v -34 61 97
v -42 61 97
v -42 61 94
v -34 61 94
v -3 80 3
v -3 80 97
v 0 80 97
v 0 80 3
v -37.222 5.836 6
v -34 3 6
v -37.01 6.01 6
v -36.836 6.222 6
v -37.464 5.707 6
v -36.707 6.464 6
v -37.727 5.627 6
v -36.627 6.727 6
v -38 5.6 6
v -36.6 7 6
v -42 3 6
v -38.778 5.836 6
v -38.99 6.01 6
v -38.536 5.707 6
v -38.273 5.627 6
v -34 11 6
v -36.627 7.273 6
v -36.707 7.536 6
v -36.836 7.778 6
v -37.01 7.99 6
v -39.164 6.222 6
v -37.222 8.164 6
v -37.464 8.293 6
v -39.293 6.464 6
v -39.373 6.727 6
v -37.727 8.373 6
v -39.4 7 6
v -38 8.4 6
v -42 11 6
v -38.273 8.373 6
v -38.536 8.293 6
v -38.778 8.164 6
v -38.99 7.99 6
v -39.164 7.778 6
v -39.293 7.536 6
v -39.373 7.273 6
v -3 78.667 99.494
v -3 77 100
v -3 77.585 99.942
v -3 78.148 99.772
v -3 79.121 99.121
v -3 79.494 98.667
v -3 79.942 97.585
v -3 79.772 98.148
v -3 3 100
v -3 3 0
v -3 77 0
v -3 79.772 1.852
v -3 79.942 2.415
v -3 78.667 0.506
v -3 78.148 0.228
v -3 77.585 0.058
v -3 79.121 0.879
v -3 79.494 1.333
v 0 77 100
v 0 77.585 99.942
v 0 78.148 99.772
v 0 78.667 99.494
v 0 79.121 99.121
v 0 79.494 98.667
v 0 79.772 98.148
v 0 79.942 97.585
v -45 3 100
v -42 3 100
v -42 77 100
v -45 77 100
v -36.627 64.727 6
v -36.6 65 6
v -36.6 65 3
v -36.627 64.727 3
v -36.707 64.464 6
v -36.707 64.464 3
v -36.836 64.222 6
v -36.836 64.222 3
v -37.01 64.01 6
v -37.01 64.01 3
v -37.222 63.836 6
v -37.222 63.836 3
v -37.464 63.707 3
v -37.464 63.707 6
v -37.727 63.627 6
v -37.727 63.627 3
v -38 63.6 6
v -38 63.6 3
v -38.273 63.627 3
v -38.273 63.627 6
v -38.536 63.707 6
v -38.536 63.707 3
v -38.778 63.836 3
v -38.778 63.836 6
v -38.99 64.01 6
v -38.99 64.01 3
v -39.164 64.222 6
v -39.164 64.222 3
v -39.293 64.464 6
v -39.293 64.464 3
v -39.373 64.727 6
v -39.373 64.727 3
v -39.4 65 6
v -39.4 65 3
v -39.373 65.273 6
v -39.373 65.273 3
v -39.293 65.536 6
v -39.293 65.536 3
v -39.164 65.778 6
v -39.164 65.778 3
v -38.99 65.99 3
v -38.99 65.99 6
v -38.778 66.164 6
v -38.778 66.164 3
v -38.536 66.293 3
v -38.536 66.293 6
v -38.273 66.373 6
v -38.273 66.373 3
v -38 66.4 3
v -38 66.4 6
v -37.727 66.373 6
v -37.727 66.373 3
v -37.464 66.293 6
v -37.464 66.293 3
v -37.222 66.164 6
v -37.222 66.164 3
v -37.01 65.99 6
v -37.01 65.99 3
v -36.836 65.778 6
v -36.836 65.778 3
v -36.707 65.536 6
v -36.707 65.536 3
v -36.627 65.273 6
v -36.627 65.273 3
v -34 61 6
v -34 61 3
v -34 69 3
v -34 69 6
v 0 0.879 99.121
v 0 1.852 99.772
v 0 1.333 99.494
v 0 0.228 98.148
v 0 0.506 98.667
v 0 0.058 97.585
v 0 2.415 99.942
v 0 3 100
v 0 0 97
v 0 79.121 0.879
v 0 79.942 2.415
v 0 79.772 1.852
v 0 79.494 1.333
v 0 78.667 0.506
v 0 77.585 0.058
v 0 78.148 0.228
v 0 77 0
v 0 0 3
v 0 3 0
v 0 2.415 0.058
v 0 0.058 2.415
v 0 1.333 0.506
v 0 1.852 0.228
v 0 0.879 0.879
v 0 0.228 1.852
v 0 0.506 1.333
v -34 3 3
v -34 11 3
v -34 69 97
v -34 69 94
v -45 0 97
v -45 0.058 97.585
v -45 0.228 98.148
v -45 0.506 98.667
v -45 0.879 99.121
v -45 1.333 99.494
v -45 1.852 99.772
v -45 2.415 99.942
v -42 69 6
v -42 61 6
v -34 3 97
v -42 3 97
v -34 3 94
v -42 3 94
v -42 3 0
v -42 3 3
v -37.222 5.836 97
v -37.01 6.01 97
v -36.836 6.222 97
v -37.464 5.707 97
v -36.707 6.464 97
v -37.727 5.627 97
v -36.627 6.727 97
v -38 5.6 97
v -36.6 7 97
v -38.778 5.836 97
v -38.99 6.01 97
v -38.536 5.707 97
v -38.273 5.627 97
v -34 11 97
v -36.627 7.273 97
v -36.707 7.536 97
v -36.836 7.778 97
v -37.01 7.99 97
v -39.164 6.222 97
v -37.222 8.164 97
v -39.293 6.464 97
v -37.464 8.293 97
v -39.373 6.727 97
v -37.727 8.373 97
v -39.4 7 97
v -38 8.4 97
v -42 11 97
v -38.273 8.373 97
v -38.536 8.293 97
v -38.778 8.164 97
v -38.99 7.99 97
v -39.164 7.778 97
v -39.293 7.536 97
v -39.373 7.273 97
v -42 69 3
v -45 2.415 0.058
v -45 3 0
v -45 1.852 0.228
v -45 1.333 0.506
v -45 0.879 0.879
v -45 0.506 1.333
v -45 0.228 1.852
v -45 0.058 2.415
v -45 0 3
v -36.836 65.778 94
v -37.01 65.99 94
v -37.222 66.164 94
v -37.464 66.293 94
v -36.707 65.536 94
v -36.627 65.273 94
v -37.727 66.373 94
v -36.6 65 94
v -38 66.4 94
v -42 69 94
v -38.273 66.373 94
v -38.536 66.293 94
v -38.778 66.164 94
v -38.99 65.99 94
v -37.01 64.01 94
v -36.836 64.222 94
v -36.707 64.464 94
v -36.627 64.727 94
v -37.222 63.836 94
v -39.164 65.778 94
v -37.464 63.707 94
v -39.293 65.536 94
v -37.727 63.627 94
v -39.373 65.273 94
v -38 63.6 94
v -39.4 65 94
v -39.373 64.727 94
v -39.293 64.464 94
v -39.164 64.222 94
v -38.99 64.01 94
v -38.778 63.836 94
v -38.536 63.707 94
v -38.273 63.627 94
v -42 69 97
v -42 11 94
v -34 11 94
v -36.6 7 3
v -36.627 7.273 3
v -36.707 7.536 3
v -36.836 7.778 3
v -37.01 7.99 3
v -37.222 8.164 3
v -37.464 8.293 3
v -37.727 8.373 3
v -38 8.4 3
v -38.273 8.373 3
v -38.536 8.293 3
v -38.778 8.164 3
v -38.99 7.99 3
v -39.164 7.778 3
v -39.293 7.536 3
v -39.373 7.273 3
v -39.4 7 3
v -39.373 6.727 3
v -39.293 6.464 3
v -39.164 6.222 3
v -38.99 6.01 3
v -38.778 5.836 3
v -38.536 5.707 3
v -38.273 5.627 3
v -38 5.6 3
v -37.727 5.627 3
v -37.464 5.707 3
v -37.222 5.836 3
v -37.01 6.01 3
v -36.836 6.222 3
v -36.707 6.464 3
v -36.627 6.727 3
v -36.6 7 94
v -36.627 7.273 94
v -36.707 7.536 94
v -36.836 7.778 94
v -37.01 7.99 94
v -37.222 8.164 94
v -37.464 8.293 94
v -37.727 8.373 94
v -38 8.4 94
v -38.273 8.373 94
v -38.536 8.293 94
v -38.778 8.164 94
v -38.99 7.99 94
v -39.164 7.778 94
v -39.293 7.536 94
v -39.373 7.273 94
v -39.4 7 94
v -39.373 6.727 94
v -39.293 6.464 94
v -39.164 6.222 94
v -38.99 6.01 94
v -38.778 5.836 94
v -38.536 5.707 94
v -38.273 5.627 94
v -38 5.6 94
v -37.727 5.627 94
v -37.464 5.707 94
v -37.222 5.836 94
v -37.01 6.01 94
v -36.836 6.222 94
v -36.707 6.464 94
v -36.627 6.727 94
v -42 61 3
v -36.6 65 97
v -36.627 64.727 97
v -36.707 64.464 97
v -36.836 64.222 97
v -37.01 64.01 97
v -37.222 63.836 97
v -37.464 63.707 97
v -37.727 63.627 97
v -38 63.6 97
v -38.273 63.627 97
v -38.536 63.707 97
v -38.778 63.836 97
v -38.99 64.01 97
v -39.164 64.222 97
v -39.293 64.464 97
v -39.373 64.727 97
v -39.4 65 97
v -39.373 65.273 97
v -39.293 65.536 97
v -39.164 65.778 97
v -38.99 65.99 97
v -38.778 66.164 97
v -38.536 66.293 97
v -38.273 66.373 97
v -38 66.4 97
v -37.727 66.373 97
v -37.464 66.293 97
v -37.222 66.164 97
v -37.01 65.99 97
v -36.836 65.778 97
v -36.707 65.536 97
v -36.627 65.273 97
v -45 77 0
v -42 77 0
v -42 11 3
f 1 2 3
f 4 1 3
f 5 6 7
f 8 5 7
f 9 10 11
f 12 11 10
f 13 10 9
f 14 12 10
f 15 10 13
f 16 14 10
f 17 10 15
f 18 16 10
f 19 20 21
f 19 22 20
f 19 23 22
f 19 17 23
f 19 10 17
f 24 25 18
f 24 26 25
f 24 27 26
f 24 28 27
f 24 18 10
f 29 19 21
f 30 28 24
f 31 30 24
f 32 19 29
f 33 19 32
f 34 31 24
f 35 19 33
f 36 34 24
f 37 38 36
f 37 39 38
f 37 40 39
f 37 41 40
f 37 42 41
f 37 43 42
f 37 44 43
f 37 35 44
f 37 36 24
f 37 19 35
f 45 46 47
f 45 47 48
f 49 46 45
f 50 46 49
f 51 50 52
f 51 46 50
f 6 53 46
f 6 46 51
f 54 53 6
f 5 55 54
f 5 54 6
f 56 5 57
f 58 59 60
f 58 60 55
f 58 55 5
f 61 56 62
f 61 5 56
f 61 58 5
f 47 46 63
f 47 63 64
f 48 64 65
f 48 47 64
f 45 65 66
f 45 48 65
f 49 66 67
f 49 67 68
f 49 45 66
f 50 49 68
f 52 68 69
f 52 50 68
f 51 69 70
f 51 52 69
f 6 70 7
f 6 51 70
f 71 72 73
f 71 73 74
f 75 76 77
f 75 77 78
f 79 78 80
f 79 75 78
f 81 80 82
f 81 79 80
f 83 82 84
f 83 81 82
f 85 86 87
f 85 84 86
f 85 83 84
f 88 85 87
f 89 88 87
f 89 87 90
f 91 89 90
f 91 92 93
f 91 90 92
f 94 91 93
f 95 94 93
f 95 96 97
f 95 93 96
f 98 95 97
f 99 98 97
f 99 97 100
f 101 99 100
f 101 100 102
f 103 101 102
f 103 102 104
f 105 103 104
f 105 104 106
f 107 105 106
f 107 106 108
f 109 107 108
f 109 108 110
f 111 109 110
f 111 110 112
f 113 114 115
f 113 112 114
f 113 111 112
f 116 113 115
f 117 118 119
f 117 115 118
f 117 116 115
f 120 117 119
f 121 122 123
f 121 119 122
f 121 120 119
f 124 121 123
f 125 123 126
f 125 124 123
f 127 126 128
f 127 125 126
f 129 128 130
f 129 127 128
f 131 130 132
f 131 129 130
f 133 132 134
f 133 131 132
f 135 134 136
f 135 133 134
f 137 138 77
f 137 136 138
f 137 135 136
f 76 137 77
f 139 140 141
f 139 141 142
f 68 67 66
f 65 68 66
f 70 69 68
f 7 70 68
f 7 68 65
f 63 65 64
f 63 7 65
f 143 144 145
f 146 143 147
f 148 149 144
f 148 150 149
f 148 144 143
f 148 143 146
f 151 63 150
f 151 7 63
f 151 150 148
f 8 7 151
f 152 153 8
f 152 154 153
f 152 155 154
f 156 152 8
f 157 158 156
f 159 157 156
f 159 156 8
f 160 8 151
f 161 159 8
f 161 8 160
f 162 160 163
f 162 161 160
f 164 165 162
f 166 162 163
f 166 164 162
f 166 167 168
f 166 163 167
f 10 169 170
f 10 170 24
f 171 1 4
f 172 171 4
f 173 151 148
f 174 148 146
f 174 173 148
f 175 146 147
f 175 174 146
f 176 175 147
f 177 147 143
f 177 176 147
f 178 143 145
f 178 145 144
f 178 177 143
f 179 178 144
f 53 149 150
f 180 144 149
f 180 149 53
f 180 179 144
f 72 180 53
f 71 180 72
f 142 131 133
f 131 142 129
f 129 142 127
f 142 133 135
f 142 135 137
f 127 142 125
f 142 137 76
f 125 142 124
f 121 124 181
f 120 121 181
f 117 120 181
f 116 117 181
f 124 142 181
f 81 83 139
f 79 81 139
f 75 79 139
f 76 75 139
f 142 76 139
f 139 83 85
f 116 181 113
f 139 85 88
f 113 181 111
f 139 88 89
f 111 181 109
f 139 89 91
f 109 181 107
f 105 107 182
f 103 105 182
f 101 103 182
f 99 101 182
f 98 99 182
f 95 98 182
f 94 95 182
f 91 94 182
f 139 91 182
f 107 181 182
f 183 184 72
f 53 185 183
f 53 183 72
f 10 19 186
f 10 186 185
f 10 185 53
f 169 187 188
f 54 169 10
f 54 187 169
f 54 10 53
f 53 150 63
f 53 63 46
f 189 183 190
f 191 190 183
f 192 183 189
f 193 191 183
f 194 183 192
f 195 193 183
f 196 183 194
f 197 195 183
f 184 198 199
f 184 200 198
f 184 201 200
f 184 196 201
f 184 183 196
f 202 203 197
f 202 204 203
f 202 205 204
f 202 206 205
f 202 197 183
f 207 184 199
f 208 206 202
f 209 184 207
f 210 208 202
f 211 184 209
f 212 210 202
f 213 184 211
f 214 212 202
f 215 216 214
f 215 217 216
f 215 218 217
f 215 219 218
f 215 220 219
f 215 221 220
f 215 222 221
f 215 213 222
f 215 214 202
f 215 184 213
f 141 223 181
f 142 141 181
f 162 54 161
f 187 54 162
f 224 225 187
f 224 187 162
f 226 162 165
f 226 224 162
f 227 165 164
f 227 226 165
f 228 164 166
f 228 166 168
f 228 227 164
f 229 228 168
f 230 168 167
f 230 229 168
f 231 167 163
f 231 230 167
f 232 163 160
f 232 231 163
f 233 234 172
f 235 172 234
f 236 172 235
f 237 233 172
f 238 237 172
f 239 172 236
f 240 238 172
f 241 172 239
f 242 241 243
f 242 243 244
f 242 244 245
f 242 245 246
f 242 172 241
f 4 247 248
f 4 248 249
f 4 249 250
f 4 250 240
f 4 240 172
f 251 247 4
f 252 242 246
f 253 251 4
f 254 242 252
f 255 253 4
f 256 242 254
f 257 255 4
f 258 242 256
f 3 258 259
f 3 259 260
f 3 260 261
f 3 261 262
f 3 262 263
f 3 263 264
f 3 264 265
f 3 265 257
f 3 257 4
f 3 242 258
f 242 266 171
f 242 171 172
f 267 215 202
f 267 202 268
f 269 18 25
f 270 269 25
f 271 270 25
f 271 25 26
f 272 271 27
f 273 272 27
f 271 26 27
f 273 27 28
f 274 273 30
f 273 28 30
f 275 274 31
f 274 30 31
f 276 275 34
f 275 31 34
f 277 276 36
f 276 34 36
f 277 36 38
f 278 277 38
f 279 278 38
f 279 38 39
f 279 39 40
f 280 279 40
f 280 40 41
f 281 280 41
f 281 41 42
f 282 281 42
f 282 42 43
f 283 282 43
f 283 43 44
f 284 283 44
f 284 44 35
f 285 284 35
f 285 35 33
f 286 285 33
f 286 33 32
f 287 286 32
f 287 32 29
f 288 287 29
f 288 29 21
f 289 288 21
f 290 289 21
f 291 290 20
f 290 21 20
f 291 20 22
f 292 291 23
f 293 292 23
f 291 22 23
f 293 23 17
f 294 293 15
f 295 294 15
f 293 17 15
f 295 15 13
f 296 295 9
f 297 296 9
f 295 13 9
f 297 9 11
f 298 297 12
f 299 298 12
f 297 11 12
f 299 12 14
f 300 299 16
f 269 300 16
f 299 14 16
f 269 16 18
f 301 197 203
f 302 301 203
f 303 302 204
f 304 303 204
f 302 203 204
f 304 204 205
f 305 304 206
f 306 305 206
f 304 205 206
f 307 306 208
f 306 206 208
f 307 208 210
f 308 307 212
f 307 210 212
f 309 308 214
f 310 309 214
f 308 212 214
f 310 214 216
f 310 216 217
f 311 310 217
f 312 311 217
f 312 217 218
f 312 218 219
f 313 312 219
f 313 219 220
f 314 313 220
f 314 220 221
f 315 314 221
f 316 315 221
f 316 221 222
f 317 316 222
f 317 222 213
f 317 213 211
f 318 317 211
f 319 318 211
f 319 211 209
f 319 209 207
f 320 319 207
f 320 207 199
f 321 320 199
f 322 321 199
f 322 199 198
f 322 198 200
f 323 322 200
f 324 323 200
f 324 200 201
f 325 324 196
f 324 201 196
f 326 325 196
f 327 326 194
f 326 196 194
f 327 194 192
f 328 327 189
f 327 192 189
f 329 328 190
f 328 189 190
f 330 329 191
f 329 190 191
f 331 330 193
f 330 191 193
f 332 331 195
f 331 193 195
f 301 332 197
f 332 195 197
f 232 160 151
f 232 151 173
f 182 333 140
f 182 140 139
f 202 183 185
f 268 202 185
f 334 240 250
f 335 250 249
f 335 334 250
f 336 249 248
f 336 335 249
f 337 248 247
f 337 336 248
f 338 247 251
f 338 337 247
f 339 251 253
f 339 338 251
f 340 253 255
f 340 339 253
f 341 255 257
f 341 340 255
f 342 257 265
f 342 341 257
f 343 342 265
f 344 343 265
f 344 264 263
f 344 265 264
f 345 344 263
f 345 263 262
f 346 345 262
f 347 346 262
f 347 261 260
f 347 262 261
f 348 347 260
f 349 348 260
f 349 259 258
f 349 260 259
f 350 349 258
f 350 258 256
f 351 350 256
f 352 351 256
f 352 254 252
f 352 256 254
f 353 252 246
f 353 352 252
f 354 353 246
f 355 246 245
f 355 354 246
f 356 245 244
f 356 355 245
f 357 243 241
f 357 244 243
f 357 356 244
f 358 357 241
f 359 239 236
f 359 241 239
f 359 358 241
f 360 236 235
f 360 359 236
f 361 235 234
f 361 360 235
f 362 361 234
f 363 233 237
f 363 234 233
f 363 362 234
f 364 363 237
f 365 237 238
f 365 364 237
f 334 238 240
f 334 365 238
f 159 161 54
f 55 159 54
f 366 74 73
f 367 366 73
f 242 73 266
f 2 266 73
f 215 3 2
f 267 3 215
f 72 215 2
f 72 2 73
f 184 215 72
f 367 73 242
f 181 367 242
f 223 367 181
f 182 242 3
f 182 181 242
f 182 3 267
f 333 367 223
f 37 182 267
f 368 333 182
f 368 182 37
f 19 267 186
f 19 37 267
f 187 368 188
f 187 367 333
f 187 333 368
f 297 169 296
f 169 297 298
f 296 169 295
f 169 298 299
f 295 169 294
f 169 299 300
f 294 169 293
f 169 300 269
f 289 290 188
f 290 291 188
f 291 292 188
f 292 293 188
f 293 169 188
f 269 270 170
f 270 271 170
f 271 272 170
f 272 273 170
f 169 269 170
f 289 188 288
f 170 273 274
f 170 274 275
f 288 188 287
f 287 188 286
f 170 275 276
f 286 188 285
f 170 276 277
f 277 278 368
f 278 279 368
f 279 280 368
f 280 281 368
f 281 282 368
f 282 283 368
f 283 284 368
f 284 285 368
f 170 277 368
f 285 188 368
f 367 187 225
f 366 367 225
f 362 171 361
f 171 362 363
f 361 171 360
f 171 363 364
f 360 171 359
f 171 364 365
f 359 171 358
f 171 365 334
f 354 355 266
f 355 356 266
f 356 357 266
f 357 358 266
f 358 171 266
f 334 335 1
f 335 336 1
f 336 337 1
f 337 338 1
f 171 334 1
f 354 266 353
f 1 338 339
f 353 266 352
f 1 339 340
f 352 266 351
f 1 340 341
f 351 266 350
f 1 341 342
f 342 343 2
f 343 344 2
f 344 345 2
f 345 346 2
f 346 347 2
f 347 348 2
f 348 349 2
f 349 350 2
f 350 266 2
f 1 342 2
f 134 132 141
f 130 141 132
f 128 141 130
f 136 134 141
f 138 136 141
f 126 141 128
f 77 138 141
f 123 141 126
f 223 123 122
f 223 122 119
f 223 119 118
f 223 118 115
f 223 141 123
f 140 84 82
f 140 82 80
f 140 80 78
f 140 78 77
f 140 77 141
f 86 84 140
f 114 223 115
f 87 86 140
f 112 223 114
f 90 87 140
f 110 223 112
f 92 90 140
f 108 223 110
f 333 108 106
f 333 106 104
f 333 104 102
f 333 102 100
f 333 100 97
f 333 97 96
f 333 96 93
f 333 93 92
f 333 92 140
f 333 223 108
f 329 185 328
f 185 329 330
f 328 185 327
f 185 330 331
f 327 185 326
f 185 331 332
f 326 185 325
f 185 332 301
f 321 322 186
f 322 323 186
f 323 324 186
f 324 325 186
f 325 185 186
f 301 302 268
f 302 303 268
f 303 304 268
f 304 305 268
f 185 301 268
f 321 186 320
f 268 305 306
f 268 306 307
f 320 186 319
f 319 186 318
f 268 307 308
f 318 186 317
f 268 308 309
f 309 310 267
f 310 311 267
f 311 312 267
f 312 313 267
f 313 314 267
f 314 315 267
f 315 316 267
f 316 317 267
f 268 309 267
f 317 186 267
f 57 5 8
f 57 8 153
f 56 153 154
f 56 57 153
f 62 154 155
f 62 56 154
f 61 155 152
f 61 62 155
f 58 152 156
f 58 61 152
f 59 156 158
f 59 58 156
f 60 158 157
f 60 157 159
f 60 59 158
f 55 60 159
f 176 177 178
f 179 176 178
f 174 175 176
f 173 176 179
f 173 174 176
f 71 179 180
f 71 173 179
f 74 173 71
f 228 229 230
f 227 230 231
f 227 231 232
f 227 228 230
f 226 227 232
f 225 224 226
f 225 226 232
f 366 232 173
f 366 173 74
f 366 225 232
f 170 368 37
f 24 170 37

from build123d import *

# Parameters (mm, degrees)
BOSS_EXTRUDE1_DEPTH                        = 100
SKETCH2_W                                  = 3
SKETCH2_H                                  = 8
BOSS_EXTRUDE2_DEPTH                        = 8
MIRROR1_AT_THE_SECOND_PLANE_COPY_1_SKETC_W = 3
MIRROR1_AT_THE_SECOND_PLANE_COPY_1_SKETC_H = 8
MIRROR1_AT_THE_SECOND_PLANE_COPY_1_DEPTH   = 8
SKETCH3_R                                  = 1.4
CUT_EXTRUDE1_DEPTH                         = 134.54400024
FILLET1_START                              = -46
FILLET1_DEPTH                              = 47


with BuildPart() as part:
    # Sketch1 → Boss-Extrude1 (new body)
    with BuildSketch(Plane.XY):
        Polygon((-3, 80), (0, 80), (0, 0), (-45, 0), (-45, 77), (-42, 77), (-42, 3), (-3, 3), align=None)
    extrude(amount=BOSS_EXTRUDE1_DEPTH)

    # Sketch2 → Boss-Extrude2 (add)
    with BuildSketch(Plane(origin=(-42, 0, 0), x_dir=(0, 0, -1), z_dir=(1, 0, 0))):
        with Locations((-95.5, 7)):
            Rectangle(SKETCH2_W, SKETCH2_H)
    boss_extrude2 = extrude(amount=BOSS_EXTRUDE2_DEPTH)

    # Mirror1: Boss-Extrude2 across plane
    add(boss_extrude2.mirror(Plane.ZX.offset(36)))

    # Mirror1 at the second plane: Boss-Extrude2 across plane
    add(boss_extrude2.mirror(Plane.XY.offset(50)))

    # Mirror1 at the second plane copy 1 sketc → Mirror1 at the second plane copy 1 (add)
    with BuildSketch(Plane(origin=(-42, 72, 100), x_dir=(0, 0, 1), z_dir=(1, 0, 0))):
        with Locations((-95.5, 7)):
            Rectangle(MIRROR1_AT_THE_SECOND_PLANE_COPY_1_SKETC_W, MIRROR1_AT_THE_SECOND_PLANE_COPY_1_SKETC_H)
    extrude(amount=MIRROR1_AT_THE_SECOND_PLANE_COPY_1_DEPTH)

    # Sketch3 → Cut-Extrude1 (cut, through all)
    with BuildSketch(Plane.XY.offset(97)):
        with Locations((-38, 7)):
            Circle(SKETCH3_R)
    cut_extrude1 = extrude(amount=-CUT_EXTRUDE1_DEPTH, mode=Mode.SUBTRACT)

    # Mirror2: Cut-Extrude1 across plane
    add(cut_extrude1.mirror(Plane.ZX.offset(36)), mode=Mode.SUBTRACT)

    # Fillet1: read off the stored shape, not the designer's step
    # Fillet1 outline → Fillet1 (cut)
    with BuildSketch(Plane.YZ.offset(FILLET1_START)):
        with BuildLine():
            Line((80, 0), (80, 3))
            ThreePointArc((80, 3), (79.121320344, 0.878679656), (77, 0))
            Line((77, 0), (80, 0))
        make_face()
        with BuildLine():
            ThreePointArc((77, 100), (79.121320344, 99.121320344), (80, 97))
            Line((80, 97), (80, 100))
            Line((80, 100), (77, 100))
        make_face()
        with BuildLine():
            Line((0, 0), (3, 0))
            ThreePointArc((3, 0), (0.878679656, 0.878679656), (0, 3))
            Line((0, 3), (0, 0))
        make_face()
        with BuildLine():
            ThreePointArc((0, 97), (0.878679656, 99.121320344), (3, 100))
            Line((3, 100), (0, 100))
            Line((0, 100), (0, 97))
        make_face()
    extrude(amount=FILLET1_DEPTH, mode=Mode.SUBTRACT)


solid = part.part
